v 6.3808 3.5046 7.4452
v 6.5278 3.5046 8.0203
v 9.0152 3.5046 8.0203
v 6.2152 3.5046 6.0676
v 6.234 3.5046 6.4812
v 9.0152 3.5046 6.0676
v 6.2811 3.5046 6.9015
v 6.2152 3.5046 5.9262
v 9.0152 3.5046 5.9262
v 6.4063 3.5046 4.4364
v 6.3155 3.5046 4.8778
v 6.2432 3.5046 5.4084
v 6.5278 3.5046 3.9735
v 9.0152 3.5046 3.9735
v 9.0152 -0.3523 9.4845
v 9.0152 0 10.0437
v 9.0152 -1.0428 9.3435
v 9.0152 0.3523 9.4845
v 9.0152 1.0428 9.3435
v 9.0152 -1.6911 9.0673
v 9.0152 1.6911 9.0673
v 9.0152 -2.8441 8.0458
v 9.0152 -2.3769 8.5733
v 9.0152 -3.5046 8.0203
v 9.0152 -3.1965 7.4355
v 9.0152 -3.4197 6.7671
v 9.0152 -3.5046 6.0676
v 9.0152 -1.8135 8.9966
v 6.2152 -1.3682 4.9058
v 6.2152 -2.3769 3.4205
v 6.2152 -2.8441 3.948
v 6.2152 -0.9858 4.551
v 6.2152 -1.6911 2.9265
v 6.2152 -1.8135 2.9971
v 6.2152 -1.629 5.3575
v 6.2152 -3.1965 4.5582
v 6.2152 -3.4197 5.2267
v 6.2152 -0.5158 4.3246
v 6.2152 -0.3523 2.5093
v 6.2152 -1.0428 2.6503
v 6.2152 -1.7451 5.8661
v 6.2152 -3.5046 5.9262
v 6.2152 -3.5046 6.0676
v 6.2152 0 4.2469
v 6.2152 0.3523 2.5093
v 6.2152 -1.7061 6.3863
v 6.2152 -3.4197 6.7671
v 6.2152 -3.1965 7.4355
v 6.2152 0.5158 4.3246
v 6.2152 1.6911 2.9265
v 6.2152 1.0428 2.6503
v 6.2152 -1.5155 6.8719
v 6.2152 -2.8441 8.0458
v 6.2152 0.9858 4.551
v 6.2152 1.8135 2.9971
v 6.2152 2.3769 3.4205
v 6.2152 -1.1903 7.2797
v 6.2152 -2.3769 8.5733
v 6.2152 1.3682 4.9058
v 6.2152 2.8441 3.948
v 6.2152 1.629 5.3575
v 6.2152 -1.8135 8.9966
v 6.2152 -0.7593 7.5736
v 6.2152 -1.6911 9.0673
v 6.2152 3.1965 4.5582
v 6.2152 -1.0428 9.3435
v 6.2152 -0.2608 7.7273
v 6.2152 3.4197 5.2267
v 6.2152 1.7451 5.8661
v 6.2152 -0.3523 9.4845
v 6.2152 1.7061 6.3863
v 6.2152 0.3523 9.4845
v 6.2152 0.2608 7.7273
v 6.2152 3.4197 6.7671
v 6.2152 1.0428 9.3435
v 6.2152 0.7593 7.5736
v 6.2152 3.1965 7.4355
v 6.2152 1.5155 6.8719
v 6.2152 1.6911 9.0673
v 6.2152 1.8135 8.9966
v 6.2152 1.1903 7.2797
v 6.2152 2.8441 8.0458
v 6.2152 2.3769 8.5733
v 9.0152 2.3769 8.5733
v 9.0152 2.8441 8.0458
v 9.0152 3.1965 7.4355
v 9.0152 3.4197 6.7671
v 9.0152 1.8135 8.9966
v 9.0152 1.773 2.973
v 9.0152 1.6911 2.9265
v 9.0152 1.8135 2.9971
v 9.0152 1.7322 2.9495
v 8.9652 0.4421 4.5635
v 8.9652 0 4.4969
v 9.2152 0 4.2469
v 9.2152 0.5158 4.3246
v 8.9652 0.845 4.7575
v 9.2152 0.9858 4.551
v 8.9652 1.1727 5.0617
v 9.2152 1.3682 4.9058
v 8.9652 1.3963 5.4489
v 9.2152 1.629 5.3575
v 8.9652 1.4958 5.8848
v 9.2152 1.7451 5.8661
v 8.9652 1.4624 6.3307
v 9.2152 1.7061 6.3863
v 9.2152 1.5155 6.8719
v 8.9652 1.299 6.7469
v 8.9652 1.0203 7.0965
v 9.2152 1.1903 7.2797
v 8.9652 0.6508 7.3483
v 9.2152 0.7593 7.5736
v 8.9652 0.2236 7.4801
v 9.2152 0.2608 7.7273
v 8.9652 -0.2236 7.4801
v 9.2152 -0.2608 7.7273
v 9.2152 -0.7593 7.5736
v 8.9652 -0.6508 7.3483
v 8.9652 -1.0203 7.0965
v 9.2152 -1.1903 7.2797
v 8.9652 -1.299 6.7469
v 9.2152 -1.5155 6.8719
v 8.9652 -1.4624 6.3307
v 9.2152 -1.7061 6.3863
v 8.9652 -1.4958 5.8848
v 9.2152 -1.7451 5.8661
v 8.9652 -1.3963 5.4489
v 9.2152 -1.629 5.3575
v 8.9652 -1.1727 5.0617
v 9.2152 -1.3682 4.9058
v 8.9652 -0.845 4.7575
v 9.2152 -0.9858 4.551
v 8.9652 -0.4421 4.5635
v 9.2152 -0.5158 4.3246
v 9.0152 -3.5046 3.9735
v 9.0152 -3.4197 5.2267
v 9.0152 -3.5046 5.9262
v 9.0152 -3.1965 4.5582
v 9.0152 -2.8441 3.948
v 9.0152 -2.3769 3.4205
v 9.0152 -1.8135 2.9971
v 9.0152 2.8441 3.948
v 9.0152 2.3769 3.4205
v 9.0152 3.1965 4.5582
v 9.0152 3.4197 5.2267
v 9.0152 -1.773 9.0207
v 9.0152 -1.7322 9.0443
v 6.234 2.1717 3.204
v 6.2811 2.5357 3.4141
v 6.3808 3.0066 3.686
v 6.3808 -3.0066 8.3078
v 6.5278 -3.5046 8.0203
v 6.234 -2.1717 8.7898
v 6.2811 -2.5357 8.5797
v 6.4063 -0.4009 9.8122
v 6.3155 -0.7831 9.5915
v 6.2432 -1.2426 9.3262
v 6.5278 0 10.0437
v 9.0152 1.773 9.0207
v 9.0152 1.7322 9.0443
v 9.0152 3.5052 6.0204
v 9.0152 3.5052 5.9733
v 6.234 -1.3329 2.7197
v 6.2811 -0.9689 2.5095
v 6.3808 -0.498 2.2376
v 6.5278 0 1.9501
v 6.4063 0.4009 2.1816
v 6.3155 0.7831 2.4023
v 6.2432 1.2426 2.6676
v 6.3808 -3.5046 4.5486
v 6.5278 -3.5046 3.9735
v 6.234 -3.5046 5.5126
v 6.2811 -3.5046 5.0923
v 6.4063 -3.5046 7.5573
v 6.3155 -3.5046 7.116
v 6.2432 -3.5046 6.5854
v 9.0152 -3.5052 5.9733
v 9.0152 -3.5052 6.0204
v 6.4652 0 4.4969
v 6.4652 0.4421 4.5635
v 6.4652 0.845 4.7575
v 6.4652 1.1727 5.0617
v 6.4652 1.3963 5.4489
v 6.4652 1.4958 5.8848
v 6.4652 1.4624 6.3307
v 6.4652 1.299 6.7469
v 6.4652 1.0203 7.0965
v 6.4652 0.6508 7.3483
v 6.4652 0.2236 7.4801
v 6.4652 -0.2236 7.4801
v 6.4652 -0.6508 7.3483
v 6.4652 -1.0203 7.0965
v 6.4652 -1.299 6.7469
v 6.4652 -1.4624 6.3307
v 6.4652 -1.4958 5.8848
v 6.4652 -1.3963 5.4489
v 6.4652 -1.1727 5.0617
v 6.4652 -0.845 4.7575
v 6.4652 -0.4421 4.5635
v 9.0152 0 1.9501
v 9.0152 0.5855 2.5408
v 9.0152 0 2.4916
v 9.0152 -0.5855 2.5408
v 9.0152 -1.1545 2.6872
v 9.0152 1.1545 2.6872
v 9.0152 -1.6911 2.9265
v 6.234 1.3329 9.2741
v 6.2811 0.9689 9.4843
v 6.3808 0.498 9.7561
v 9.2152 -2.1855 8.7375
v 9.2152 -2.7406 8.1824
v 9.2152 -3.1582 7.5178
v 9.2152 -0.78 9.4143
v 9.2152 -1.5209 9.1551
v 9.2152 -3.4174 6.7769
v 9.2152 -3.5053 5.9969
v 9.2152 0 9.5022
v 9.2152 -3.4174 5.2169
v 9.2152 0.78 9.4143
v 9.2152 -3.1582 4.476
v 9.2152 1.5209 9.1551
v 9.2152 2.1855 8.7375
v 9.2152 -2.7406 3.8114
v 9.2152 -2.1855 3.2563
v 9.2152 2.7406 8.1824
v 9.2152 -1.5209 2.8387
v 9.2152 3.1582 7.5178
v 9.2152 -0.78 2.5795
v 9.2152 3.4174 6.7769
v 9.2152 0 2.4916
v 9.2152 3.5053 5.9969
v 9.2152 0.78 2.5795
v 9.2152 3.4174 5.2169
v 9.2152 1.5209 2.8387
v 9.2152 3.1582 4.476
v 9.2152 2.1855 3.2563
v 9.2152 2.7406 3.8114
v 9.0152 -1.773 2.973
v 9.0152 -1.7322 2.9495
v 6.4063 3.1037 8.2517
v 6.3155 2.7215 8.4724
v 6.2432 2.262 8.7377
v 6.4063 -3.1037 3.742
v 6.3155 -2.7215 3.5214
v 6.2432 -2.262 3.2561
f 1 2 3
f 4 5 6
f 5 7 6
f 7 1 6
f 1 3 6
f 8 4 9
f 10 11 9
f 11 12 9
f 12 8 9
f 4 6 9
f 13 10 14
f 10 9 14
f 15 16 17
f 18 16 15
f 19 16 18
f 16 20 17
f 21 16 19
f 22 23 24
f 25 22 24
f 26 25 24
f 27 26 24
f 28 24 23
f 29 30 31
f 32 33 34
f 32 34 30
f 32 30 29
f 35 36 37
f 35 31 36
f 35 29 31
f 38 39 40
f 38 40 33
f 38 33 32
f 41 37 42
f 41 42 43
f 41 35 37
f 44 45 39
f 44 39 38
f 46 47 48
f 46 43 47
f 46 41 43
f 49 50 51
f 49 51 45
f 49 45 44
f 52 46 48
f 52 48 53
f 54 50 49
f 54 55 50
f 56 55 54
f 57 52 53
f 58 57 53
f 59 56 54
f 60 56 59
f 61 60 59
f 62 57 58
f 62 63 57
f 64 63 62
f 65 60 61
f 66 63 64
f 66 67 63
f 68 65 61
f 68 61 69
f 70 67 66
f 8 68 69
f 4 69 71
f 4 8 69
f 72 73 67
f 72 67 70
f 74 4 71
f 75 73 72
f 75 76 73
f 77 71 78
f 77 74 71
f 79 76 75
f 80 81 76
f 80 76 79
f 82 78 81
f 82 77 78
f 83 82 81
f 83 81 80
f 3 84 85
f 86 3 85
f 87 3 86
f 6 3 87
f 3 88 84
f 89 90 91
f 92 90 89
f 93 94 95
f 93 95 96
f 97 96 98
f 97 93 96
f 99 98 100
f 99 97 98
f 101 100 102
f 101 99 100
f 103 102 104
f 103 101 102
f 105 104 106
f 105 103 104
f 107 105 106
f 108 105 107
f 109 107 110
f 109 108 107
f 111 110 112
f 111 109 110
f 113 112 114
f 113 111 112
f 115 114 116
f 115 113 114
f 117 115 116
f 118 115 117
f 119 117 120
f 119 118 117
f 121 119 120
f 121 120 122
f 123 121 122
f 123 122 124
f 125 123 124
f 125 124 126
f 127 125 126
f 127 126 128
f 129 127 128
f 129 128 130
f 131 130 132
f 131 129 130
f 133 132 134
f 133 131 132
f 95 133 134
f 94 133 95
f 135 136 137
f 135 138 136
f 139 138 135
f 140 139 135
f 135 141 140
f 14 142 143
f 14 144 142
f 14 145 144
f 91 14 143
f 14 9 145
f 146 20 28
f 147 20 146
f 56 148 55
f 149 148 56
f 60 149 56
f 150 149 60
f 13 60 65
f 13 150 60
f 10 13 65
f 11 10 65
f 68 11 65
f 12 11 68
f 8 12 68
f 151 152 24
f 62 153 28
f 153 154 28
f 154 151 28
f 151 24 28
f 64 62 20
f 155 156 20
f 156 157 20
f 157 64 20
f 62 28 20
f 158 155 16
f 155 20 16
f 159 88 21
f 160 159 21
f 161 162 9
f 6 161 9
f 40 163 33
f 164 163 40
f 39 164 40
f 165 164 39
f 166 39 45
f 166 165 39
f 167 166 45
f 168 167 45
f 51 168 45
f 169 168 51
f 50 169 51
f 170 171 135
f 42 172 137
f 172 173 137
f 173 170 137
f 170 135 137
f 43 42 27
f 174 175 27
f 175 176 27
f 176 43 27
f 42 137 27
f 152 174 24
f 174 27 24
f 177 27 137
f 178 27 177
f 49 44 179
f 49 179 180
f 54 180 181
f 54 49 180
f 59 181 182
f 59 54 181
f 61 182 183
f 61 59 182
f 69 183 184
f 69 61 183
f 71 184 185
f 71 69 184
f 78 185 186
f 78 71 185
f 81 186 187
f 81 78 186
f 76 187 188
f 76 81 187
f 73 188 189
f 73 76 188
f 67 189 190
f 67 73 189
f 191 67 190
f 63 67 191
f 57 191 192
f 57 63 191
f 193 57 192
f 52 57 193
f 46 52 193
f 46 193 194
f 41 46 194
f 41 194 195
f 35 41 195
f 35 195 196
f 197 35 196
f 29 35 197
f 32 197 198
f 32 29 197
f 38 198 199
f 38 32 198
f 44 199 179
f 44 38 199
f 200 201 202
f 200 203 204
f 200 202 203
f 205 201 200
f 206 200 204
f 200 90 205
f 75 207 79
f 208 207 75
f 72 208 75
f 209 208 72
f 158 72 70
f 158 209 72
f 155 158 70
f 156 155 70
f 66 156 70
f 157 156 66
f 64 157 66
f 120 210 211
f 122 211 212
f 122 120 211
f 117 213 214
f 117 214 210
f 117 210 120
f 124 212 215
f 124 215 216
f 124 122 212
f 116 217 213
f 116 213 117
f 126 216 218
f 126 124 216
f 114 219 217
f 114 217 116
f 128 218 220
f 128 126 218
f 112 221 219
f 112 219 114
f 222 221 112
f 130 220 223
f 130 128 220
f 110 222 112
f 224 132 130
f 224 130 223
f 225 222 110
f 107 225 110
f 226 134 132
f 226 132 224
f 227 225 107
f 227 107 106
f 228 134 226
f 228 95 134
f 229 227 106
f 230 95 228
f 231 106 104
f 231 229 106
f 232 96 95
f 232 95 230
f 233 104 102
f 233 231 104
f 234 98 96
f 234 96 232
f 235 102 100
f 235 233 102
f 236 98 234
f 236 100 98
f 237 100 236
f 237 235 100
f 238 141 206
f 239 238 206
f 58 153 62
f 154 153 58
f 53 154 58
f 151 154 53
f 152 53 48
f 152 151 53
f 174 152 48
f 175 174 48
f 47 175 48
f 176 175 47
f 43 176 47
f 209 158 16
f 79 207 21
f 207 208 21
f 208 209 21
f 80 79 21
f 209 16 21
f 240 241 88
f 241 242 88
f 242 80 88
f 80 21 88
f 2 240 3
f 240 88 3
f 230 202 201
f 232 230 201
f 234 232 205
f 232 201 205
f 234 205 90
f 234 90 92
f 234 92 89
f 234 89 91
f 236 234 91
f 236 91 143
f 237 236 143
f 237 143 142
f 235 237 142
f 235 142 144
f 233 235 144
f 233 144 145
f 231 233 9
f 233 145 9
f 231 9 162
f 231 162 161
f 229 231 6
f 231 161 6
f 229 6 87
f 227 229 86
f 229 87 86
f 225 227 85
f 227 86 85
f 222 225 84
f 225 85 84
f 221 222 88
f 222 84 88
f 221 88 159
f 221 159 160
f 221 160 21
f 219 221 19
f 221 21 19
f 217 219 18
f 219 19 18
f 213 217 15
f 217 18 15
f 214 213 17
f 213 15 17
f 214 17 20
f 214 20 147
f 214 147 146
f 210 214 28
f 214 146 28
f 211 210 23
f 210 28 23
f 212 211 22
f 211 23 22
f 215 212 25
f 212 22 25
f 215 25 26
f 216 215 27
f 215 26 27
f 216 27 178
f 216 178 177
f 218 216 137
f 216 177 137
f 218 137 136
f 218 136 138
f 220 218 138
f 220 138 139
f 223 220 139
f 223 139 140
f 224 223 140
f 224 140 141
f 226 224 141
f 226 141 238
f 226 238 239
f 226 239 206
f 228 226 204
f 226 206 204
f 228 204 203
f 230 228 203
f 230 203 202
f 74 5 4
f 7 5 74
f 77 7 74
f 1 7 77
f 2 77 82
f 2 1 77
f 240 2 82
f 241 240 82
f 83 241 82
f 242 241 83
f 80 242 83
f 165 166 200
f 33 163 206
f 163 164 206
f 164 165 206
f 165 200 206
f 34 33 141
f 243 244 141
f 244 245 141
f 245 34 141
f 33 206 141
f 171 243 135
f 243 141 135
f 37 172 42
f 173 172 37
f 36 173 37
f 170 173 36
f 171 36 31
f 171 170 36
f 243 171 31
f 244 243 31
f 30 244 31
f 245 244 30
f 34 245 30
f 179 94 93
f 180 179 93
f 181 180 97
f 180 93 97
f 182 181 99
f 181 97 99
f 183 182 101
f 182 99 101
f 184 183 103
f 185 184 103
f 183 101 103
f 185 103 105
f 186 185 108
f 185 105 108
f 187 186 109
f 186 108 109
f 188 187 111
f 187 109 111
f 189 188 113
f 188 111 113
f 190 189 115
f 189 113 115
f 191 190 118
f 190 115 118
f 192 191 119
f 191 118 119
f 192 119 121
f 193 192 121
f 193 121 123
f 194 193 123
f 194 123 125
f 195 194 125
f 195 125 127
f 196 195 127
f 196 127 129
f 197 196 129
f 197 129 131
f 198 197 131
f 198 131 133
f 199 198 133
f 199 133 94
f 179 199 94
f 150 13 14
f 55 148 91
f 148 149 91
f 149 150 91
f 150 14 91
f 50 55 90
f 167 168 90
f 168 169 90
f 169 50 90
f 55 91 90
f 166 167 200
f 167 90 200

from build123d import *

# Parameters (mm, degrees)
CUT_EXTRUDE8_DEPTH   = 3.5
SKETCH16_R           = 3.505318085
BOSS_EXTRUDE10_DEPTH = 0.2
SKETCH17_R           = 1.5
CUT_EXTRUDE9_DEPTH   = 5
CHAMFER2_SIZE        = 0.25


with BuildPart() as part:
    # Sketch6 → Revolve10 (revolve)
    with BuildSketch(Plane(origin=(0, 0, 0), x_dir=(1, 0, 0), z_dir=(0, 1, 0))):
        Polygon((9.015233675, -1.950120561), (9.015233675, -5.996890529), (6.215233675, -5.996890529), (6.215233675, -2.491572445), (6.527841066, -1.950120561), align=None)
    revolve(axis=Axis((5.148806832, 0, 5.996890529), (1, 0, 0)))

    # Sketch14 → Cut-Extrude8 (cut)
    with BuildSketch(Plane(origin=(9.015233675, 0, 0), x_dir=(0, 0, -1), z_dir=(1, 0, 0))):
        with BuildLine():
            Line((-8.020275514, 3.504605596), (-3.973505545, 3.504605596))
            ThreePointArc((-3.973505545, 3.504605596), (-5.996890529, 4.046769969), (-8.020275514, 3.504605596))
        make_face()
        with BuildLine():
            Line((-10.043660498, 0), (-8.020275514, 3.504605596))
            ThreePointArc((-8.020275514, 3.504605596), (-9.501496126, 2.023384984), (-10.043660498, 0))
        make_face()
        with BuildLine():
            ThreePointArc((-10.043660498, 0), (-9.501496126, -2.023384984), (-8.020275514, -3.504605596))
            Line((-8.020275514, -3.504605596), (-10.043660498, 0))
        make_face()
        with BuildLine():
            ThreePointArc((-8.020275514, -3.504605596), (-5.996890529, -4.046769969), (-3.973505545, -3.504605596))
            Line((-3.973505545, -3.504605596), (-8.020275514, -3.504605596))
        make_face()
        with BuildLine():
            ThreePointArc((-3.973505545, -3.504605596), (-2.492284933, -2.023384984), (-1.950120561, 0))
            Line((-1.950120561, 0), (-3.973505545, -3.504605596))
        make_face()
        with BuildLine():
            Line((-3.973505545, 3.504605596), (-1.950120561, 0))
            ThreePointArc((-1.950120561, 0), (-2.492284933, 2.023384984), (-3.973505545, 3.504605596))
        make_face()
    extrude(amount=-CUT_EXTRUDE8_DEPTH, mode=Mode.SUBTRACT)

    # Sketch16 → Boss-Extrude10 (add)
    with BuildSketch(Plane(origin=(9.015233675, 0, 0), x_dir=(0, 0, -1), z_dir=(1, 0, 0))):
        with Locations((-5.996890529, 0)):
            Circle(SKETCH16_R)
    extrude(amount=BOSS_EXTRUDE10_DEPTH)

    # Sketch17 → Cut-Extrude9 (cut)
    with BuildSketch(Plane(origin=(9.215233675, 0, 0), x_dir=(0, 0, -1), z_dir=(1, 0, 0))):
        with Locations((-5.996890529, 0)):
            Circle(SKETCH17_R)
    extrude(amount=-CUT_EXTRUDE9_DEPTH, mode=Mode.SUBTRACT)

    # Chamfer2
    chamfer2_edges = [part.edges().sort_by_distance(p)[0] for p in [
        (6.215233675, 0, 7.496890529),
        (9.215233675, 0, 7.496890529),
    ]]
    chamfer(chamfer2_edges, length=CHAMFER2_SIZE)


solid = part.part
